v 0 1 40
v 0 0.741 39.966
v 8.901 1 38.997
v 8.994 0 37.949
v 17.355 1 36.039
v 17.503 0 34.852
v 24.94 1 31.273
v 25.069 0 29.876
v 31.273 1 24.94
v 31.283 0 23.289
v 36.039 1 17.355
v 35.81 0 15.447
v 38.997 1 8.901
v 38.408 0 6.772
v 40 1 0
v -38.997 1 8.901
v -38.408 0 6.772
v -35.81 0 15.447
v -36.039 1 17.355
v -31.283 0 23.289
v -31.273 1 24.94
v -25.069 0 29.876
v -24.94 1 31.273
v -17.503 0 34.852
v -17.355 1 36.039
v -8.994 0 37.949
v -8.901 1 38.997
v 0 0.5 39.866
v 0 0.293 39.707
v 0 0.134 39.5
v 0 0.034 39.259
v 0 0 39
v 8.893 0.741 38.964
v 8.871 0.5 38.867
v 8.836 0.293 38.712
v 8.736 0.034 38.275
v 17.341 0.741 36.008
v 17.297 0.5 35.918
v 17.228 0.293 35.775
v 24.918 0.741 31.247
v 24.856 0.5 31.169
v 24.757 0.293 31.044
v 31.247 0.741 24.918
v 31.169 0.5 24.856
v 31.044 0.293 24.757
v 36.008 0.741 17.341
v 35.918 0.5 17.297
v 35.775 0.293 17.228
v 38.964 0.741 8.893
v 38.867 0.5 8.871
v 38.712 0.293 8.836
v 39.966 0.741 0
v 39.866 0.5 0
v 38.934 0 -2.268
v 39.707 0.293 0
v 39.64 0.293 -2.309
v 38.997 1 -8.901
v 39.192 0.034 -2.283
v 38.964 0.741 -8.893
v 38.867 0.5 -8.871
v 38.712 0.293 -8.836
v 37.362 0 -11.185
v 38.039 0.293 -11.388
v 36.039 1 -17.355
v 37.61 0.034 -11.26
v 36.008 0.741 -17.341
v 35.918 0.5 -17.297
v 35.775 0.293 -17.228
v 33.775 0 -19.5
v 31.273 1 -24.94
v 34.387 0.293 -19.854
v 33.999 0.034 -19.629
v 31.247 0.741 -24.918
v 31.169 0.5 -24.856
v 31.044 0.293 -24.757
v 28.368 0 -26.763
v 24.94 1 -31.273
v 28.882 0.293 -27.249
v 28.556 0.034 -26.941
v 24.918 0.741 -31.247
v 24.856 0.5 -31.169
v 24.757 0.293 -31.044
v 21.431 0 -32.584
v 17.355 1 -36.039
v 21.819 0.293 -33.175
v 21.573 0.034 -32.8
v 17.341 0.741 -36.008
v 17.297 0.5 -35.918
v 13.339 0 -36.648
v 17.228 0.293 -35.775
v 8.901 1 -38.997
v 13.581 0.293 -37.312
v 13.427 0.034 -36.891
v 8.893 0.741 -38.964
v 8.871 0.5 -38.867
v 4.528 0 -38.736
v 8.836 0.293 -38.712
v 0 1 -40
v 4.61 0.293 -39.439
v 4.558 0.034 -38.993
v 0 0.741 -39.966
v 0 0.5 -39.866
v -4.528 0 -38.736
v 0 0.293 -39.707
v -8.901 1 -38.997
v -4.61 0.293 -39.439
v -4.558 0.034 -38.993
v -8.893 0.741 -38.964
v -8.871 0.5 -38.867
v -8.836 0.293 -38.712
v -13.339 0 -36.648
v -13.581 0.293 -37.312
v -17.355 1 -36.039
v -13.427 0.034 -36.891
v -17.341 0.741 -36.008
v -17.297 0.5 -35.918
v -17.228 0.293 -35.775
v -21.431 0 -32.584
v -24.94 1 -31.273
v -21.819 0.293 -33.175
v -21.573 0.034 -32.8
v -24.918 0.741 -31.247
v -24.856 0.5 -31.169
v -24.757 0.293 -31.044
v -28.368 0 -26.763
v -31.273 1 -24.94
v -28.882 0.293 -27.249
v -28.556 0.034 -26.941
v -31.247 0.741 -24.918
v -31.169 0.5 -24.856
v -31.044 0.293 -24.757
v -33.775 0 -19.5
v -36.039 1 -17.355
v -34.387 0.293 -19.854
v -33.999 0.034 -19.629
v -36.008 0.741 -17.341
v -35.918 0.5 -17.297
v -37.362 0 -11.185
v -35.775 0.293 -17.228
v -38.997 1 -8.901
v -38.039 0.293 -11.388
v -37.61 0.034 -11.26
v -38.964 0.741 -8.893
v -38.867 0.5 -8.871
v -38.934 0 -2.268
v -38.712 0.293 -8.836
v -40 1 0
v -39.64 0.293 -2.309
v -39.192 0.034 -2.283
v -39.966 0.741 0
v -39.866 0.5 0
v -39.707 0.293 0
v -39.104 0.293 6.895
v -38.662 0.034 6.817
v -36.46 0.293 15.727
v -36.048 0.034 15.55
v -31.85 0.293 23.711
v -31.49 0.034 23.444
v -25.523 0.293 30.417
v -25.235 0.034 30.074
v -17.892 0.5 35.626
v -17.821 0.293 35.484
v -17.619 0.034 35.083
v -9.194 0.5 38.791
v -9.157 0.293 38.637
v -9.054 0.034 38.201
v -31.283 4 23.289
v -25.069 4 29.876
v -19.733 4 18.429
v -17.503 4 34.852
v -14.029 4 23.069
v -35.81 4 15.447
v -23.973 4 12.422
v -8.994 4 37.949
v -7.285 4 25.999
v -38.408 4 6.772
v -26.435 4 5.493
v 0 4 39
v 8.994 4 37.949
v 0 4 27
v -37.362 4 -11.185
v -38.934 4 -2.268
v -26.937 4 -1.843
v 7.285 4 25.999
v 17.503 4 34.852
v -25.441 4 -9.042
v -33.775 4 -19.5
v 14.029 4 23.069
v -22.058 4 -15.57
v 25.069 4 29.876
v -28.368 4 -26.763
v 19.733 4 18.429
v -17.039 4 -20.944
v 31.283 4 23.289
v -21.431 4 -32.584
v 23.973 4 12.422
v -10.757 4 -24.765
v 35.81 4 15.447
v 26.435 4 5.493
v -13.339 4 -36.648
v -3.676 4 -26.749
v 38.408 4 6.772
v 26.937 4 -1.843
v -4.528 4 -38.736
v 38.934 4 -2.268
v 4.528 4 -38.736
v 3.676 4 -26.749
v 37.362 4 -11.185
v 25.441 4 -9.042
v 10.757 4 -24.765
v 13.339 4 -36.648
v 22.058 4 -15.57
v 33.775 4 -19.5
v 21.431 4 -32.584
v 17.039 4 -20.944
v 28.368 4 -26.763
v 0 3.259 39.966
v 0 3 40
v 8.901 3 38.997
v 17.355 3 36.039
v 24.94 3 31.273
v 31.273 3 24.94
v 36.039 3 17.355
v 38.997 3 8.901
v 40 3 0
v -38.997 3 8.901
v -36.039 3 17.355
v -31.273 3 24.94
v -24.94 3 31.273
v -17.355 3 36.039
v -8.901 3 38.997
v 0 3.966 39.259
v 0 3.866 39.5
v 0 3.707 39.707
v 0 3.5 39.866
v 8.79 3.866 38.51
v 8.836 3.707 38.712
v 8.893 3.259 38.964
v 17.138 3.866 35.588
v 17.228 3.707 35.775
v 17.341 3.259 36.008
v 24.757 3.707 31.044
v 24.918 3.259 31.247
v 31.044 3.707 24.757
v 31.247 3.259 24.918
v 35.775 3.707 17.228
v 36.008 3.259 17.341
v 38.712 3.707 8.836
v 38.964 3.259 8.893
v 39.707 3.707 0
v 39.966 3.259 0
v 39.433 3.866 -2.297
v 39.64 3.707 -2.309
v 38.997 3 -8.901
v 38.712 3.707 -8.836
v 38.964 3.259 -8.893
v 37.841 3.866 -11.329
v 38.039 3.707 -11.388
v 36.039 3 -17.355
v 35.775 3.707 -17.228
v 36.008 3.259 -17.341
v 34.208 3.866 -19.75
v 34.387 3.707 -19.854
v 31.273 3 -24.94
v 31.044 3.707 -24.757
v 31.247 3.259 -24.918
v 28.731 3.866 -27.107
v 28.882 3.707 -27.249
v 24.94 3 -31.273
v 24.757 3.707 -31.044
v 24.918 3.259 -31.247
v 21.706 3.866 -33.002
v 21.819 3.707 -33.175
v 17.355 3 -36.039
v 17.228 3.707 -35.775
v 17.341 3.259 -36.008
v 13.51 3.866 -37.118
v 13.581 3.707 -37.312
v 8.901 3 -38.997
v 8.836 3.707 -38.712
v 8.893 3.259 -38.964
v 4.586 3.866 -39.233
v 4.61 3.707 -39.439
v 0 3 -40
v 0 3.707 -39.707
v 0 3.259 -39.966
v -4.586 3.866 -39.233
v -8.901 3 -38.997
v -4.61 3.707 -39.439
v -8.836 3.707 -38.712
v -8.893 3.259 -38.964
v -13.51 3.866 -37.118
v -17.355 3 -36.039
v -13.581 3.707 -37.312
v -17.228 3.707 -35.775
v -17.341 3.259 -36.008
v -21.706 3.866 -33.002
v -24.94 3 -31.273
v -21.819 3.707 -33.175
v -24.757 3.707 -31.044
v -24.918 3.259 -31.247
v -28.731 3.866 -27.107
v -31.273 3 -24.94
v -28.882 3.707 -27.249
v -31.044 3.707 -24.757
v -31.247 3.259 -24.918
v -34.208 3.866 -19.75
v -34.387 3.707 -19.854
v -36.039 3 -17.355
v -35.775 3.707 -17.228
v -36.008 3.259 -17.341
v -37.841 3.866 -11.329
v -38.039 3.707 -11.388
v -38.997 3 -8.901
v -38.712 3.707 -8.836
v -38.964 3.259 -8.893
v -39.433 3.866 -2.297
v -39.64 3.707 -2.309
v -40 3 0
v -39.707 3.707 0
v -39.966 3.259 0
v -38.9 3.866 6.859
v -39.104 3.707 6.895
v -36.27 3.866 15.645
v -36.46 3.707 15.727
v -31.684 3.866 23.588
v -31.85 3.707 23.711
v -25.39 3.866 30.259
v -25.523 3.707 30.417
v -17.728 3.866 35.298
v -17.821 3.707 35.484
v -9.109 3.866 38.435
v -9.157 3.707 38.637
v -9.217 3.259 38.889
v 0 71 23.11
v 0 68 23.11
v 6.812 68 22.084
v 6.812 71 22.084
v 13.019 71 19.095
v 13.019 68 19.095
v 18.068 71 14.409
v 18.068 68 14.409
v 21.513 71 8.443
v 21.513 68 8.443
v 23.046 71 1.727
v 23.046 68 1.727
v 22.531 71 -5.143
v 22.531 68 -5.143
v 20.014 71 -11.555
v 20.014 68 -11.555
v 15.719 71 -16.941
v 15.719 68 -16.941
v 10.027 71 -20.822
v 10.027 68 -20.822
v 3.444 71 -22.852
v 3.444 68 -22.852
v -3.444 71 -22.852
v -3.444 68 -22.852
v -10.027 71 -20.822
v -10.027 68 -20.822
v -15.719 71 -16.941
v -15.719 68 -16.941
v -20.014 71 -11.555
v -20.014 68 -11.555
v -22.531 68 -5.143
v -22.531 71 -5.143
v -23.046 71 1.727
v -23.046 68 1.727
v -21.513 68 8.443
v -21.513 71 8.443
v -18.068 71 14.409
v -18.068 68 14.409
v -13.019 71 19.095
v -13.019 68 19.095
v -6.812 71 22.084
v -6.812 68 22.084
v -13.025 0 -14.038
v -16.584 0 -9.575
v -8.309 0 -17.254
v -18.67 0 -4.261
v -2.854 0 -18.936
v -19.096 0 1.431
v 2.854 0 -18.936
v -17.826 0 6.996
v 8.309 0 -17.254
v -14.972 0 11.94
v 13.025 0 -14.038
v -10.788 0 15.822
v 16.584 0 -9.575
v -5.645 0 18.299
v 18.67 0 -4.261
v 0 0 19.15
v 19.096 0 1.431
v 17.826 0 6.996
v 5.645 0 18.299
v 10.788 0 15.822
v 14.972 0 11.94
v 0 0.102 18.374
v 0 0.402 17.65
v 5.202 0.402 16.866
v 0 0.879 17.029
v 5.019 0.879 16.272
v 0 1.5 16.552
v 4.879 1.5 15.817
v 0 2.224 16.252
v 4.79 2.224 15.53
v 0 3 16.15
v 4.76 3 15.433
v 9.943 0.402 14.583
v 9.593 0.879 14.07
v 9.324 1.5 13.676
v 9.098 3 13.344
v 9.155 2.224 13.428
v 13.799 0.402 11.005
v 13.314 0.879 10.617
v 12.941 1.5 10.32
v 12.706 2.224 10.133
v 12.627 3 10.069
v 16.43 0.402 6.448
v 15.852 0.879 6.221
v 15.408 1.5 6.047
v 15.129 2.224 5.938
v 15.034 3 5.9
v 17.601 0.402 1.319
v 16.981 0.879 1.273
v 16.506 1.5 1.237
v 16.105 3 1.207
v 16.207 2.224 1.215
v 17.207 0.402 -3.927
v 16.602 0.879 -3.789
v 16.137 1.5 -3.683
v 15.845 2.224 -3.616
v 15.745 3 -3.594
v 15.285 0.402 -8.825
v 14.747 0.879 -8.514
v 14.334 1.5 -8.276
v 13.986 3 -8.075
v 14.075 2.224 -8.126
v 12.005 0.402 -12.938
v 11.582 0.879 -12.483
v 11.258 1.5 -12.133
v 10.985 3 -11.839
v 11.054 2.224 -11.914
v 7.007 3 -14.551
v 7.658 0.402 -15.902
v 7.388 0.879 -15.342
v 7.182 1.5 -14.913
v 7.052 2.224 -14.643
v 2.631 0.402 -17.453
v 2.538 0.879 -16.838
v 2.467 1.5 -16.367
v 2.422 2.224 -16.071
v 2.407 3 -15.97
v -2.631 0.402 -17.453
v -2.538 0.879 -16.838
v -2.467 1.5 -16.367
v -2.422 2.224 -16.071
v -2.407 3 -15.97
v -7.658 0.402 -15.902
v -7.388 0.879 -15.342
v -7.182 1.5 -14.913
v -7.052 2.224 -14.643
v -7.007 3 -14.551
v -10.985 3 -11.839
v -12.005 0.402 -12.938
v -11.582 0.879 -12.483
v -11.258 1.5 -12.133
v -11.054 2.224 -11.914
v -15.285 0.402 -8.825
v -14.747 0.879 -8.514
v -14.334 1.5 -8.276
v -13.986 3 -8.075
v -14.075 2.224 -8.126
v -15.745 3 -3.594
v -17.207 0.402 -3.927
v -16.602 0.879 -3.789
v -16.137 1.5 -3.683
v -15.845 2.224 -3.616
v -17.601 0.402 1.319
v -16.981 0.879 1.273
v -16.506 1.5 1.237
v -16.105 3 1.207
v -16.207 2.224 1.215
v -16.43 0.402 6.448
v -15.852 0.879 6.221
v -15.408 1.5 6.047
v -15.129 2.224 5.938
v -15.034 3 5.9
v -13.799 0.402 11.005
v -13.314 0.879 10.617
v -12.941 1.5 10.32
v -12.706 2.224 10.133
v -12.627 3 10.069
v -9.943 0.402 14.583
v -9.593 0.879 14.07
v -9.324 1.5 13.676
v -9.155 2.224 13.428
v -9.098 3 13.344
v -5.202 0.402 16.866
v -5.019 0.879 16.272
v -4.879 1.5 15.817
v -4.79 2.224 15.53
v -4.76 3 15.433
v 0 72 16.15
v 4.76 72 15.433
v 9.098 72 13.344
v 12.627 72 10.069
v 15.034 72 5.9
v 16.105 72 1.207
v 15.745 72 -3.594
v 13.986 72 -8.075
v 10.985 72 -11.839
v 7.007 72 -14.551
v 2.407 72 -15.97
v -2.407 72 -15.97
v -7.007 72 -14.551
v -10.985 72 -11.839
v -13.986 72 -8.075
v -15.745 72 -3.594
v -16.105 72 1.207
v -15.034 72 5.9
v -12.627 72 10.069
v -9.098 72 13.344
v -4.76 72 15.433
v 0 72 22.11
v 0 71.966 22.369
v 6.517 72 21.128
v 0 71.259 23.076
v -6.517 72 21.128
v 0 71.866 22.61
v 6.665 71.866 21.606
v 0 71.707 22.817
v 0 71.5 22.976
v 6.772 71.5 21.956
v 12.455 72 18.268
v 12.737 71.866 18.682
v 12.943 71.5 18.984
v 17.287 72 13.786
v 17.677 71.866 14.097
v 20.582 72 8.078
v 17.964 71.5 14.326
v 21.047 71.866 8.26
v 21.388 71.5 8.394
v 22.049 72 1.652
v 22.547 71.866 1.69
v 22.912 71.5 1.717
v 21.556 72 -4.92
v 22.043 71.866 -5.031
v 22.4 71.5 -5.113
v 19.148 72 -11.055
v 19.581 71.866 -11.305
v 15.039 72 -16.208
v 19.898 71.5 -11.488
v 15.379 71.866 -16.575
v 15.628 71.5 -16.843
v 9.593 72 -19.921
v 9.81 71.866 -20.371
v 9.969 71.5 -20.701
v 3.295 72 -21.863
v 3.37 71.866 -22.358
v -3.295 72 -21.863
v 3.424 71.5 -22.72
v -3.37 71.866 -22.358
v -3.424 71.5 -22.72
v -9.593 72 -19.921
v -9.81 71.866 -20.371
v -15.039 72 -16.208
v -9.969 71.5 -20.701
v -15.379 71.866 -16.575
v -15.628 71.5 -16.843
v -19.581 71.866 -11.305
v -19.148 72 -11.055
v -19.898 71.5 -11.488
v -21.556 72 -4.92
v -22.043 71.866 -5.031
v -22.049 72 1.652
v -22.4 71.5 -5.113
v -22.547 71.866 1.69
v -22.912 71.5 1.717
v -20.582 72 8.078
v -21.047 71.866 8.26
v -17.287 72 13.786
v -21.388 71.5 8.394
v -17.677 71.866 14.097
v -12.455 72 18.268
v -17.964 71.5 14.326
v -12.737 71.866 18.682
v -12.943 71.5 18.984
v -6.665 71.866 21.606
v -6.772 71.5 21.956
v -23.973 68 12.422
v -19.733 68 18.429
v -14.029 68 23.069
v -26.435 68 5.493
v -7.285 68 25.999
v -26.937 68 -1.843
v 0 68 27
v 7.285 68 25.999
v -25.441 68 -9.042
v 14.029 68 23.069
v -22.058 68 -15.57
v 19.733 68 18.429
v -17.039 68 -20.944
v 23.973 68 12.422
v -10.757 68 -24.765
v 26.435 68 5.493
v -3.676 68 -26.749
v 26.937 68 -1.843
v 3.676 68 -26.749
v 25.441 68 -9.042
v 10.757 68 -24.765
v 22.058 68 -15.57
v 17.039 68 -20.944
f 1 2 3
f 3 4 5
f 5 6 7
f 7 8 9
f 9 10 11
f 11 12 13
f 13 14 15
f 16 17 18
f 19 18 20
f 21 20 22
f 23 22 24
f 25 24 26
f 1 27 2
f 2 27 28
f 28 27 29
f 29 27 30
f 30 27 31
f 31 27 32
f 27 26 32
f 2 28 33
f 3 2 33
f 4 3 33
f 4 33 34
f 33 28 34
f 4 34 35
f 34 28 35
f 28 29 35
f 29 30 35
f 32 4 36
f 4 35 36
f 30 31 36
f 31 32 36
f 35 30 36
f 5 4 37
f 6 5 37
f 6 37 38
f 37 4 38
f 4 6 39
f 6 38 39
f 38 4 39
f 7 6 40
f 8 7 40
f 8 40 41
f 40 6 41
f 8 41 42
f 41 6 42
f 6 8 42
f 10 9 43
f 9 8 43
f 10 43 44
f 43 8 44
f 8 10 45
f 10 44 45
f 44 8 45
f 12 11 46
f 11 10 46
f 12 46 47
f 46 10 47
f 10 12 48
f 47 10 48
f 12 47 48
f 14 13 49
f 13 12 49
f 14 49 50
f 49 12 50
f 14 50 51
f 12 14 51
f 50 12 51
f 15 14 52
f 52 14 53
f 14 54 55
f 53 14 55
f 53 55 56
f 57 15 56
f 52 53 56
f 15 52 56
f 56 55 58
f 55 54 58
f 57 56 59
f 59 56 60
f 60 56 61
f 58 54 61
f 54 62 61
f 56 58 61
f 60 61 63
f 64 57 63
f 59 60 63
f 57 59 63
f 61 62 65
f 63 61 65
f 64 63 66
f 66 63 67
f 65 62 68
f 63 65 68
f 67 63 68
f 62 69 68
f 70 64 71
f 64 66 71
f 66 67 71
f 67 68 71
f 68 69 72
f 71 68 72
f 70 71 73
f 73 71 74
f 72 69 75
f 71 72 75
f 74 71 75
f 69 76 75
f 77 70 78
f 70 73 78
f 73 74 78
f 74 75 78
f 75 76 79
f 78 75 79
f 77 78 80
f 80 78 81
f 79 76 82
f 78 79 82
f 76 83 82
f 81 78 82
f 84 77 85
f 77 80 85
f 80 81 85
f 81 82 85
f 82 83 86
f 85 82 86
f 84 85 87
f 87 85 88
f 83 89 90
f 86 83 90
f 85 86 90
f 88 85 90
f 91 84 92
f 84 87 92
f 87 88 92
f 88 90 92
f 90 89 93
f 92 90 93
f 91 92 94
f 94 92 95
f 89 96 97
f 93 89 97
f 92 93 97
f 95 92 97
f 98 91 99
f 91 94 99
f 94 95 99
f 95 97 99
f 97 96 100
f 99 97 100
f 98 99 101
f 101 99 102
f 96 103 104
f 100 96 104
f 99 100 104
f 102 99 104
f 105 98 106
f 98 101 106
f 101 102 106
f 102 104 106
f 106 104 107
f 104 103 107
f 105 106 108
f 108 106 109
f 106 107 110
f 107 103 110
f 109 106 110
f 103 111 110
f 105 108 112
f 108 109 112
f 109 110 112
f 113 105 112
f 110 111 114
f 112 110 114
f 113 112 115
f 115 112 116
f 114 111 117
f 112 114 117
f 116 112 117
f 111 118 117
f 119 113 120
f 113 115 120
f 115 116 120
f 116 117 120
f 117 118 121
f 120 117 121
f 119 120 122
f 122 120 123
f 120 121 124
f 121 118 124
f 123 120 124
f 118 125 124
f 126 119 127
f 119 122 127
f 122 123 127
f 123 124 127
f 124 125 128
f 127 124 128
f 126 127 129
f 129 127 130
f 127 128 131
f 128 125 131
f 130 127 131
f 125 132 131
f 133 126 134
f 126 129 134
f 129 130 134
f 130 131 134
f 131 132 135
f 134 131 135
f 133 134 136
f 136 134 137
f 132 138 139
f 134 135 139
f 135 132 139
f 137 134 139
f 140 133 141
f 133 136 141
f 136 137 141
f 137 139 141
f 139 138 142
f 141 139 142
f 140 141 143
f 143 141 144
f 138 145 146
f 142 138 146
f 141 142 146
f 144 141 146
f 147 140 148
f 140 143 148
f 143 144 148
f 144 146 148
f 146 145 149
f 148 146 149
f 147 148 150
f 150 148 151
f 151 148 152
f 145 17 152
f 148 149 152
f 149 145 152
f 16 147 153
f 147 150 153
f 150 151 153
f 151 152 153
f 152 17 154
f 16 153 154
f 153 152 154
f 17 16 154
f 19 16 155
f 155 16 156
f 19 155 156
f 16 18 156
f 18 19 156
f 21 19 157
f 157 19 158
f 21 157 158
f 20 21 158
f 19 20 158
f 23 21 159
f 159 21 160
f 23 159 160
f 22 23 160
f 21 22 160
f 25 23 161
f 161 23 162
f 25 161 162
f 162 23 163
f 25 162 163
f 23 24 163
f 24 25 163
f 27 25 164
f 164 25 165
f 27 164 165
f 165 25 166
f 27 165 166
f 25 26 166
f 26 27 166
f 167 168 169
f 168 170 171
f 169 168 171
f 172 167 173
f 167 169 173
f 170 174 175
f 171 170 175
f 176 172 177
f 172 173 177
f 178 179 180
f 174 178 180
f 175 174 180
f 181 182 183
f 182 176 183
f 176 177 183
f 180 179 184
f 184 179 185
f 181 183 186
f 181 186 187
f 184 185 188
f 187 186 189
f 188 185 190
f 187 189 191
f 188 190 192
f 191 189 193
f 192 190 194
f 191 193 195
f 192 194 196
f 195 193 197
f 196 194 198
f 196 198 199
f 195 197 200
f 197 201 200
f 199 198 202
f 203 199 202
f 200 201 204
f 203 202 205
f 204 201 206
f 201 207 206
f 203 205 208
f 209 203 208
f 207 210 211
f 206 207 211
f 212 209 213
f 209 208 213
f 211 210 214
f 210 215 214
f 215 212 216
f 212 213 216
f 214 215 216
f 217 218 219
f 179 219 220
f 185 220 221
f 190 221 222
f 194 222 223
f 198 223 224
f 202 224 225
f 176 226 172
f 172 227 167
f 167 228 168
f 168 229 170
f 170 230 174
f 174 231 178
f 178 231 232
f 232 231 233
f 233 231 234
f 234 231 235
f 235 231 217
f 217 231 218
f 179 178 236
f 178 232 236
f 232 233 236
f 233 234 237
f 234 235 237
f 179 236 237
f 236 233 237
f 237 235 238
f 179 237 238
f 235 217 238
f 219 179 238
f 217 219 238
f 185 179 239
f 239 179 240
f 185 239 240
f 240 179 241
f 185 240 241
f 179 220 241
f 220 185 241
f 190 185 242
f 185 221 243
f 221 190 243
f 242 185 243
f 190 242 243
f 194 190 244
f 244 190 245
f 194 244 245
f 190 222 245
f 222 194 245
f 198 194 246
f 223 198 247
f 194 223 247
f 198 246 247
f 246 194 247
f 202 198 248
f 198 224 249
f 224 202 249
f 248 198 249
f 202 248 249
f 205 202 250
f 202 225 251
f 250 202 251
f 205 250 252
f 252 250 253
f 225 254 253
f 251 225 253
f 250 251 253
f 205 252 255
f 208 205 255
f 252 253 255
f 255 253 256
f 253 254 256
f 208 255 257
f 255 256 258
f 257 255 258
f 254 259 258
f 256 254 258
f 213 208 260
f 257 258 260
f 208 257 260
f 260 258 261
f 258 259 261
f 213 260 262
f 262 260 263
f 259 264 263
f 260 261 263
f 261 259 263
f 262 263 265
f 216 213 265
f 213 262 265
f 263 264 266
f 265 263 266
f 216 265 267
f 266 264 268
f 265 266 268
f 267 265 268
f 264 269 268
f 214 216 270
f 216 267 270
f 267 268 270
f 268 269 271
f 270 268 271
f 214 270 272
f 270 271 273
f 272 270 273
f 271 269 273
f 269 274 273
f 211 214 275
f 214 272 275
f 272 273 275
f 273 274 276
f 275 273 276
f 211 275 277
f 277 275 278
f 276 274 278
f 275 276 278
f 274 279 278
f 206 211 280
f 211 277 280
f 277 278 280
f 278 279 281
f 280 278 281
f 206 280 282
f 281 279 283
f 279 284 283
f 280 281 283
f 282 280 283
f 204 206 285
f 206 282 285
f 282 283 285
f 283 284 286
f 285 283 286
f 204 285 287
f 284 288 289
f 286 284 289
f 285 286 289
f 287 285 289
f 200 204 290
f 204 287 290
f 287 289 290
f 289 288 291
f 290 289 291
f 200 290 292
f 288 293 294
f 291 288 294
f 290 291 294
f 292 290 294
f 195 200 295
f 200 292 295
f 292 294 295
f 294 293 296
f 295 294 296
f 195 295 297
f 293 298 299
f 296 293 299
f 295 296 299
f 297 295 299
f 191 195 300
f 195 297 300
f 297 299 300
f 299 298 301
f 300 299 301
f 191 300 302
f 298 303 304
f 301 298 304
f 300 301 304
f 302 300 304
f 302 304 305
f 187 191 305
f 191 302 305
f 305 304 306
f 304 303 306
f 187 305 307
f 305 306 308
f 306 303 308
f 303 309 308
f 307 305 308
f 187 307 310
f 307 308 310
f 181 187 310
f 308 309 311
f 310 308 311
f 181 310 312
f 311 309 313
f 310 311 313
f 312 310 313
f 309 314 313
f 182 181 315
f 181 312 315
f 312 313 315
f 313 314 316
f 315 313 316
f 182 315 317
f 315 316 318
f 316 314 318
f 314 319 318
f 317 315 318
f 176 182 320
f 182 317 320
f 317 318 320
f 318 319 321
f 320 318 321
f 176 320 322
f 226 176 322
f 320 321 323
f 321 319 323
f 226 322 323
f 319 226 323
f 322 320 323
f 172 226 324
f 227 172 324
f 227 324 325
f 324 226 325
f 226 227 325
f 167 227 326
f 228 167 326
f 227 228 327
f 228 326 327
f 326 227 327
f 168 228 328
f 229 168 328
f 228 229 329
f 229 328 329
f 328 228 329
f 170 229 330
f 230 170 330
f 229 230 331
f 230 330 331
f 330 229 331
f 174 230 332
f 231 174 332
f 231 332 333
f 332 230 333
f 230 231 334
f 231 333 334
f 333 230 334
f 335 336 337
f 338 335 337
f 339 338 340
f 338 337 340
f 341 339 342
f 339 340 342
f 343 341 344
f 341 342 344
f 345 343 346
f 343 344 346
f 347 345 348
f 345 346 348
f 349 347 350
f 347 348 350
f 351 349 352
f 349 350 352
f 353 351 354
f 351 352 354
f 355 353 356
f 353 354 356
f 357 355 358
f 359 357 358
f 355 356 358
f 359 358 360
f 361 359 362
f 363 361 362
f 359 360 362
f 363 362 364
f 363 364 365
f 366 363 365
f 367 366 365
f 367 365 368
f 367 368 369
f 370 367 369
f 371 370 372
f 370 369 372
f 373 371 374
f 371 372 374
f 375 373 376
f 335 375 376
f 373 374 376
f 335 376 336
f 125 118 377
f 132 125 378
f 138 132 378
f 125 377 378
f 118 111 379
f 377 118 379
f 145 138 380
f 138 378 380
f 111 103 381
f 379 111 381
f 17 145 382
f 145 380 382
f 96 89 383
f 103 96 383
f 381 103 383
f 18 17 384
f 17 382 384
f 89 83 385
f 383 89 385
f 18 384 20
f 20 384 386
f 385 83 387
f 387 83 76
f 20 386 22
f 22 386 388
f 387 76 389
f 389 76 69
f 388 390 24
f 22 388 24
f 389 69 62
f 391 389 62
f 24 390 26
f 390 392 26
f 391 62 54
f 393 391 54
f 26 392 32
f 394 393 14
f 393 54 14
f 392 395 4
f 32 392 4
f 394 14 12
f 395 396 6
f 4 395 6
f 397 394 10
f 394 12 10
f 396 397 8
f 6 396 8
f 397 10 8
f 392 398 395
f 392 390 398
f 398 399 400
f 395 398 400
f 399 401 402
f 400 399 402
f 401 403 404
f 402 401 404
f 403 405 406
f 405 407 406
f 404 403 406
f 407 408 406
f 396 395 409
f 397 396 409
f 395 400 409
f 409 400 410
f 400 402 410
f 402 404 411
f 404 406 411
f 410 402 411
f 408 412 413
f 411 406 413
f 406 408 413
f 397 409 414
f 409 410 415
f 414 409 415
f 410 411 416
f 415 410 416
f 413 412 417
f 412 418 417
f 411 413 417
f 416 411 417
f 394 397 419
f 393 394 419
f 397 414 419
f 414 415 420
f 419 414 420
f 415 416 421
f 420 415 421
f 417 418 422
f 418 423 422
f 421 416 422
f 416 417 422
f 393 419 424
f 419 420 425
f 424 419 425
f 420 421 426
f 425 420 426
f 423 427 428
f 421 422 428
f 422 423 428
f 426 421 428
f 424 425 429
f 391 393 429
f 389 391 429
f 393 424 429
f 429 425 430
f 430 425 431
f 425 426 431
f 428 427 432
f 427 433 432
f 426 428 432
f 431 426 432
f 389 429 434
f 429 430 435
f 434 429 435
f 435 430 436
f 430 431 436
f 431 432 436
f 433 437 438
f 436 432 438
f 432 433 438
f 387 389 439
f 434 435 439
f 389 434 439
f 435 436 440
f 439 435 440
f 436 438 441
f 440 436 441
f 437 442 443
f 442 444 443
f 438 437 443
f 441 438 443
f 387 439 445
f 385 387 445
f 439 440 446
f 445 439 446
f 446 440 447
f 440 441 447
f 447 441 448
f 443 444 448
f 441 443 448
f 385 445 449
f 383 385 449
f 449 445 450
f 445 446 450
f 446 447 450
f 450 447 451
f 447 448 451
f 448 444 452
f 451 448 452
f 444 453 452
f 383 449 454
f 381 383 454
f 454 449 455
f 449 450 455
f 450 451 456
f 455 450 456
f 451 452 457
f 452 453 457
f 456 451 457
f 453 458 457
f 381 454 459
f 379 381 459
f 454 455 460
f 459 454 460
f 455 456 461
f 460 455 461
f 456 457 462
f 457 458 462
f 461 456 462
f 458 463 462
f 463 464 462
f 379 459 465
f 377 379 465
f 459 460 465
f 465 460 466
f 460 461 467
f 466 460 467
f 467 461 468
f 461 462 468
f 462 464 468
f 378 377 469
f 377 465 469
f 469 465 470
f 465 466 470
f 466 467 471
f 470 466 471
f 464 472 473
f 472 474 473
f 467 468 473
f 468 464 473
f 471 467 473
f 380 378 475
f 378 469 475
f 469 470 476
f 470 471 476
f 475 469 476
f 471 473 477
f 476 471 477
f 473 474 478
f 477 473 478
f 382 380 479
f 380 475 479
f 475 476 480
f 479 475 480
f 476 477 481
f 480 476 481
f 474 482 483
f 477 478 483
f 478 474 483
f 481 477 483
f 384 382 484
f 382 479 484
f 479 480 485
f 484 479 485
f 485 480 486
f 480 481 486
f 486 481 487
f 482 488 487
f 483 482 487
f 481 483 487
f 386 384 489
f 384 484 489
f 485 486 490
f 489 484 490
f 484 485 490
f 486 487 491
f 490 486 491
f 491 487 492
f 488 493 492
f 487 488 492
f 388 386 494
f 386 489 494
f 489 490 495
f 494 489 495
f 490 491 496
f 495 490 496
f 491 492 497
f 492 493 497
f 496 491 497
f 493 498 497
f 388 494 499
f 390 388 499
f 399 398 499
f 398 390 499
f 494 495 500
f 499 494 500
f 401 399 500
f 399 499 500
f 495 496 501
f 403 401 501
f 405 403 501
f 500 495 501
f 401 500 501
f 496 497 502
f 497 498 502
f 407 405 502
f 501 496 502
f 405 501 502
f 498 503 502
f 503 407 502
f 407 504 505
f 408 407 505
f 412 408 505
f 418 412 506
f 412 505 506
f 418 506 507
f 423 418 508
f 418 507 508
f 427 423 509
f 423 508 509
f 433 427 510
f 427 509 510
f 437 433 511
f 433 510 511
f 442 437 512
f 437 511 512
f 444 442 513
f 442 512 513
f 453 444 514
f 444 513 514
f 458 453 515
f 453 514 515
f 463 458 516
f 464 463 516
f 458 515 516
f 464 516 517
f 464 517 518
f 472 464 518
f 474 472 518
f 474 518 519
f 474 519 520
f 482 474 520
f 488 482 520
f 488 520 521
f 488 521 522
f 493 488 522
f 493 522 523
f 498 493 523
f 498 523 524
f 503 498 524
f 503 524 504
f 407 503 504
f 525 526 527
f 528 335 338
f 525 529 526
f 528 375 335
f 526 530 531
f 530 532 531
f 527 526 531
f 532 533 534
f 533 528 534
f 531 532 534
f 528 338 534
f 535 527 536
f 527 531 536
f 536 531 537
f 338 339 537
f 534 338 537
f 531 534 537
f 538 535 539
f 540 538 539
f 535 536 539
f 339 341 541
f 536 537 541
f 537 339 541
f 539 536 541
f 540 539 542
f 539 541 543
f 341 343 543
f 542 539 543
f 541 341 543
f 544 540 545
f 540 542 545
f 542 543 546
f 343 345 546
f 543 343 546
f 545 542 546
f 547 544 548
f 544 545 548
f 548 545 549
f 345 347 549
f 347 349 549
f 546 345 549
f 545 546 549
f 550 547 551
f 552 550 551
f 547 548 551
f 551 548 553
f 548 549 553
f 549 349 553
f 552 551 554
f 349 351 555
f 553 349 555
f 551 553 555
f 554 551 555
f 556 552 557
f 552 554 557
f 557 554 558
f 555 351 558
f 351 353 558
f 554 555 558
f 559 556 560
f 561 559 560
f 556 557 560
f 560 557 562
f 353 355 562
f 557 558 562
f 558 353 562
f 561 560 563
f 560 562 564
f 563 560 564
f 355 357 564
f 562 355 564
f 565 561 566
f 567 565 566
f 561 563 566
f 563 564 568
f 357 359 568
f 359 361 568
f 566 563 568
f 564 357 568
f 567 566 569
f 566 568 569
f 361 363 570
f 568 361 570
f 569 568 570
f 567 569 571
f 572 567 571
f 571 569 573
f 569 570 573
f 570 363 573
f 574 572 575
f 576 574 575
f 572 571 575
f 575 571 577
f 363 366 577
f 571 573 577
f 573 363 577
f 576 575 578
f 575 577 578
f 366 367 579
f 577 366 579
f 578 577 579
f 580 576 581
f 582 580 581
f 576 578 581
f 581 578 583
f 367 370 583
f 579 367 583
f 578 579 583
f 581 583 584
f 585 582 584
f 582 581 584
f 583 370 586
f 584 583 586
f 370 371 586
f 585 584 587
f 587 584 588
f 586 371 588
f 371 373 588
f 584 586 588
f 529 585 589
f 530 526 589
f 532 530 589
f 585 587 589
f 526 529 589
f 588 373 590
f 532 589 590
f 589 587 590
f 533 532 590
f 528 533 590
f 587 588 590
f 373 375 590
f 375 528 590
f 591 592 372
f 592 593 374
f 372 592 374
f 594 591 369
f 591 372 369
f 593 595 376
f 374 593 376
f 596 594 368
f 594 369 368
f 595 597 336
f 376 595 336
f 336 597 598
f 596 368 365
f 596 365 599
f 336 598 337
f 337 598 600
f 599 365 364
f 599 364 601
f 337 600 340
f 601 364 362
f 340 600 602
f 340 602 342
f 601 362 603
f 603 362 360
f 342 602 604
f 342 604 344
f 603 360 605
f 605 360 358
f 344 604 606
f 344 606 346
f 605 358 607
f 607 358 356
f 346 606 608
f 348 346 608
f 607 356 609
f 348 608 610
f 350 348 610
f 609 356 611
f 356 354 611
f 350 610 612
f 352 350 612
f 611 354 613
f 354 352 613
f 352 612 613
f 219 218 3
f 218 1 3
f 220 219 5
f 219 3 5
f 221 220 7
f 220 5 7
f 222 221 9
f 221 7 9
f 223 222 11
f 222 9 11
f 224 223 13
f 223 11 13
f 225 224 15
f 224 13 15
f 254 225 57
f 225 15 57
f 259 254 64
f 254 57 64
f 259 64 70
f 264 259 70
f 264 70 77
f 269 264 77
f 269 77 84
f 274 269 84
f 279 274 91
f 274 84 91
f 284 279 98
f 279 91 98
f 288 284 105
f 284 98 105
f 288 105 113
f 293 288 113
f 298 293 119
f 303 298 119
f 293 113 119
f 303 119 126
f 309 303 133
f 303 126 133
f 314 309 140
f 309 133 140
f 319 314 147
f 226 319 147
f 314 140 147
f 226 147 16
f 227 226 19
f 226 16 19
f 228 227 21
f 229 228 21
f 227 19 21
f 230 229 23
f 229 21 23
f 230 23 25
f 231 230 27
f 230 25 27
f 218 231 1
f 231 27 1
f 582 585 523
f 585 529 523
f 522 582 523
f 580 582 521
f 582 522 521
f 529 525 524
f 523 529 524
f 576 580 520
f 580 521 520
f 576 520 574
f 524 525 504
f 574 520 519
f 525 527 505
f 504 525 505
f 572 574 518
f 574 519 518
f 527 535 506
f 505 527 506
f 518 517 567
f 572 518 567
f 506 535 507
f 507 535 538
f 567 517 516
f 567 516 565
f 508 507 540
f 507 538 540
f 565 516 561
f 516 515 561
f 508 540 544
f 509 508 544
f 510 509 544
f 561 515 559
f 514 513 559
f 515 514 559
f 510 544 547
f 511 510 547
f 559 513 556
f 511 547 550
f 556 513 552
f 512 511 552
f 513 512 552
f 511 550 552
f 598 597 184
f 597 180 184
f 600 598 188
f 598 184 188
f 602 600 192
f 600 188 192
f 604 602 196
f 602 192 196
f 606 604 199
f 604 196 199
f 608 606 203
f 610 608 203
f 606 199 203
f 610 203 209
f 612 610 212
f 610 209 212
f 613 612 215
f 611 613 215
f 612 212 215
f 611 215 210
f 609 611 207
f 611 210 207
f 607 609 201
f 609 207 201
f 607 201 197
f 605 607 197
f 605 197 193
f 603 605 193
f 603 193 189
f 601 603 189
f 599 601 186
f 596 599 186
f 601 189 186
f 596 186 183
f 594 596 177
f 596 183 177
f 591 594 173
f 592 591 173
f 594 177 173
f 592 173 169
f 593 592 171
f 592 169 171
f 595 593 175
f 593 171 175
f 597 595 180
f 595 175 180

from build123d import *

# Parameters (mm, degrees)
F2_DEPTH = 4.001
F3_R     = 3
F4_R     = 1


with BuildPart() as f1:
    # F0 (on Right) → F1 (revolve)
    with BuildSketch(Plane.YZ):
        with BuildLine():
            Line((0, 39), (0, 0))
            Line((0, 0), (4, 0))
            Line((4, 0), (4, 16.15))
            Line((4, 16.15), (72, 16.15))
            Line((72, 16.15), (72, 23.1103692204))
            Line((72, 23.1103692204), (68, 23.1103692204))
            Line((68, 23.1103692204), (68, 27))
            Line((68, 27), (4, 27))
            Line((4, 27), (4, 39))
            ThreePointArc((4, 39), (3.7071067812, 39.7071067812), (3, 40))
            Line((3, 40), (1, 40))
            ThreePointArc((1, 40), (0.2928932188, 39.7071067812), (0, 39))
        make_face()
    revolve(axis=Axis((0, 36, 0), (0, 1, 0)))

    # F2 (cut, through all): a face of the model
    f2_faces = [f1.faces().sort_by_distance(p)[0] for p in [
        (0, 4, 0),
    ]]
    extrude(f2_faces, amount=-F2_DEPTH, mode=Mode.SUBTRACT)

    # F3
    f3_edges = [f1.edges().sort_by_distance(p)[0] for p in [
        (0, 0, -16.15),
    ]]
    fillet(f3_edges, radius=F3_R)

    # F4
    f4_edges = [f1.edges().sort_by_distance(p)[0] for p in [
        (0, 72, -23.110369),
    ]]
    fillet(f4_edges, radius=F4_R)


solid = f1.part
